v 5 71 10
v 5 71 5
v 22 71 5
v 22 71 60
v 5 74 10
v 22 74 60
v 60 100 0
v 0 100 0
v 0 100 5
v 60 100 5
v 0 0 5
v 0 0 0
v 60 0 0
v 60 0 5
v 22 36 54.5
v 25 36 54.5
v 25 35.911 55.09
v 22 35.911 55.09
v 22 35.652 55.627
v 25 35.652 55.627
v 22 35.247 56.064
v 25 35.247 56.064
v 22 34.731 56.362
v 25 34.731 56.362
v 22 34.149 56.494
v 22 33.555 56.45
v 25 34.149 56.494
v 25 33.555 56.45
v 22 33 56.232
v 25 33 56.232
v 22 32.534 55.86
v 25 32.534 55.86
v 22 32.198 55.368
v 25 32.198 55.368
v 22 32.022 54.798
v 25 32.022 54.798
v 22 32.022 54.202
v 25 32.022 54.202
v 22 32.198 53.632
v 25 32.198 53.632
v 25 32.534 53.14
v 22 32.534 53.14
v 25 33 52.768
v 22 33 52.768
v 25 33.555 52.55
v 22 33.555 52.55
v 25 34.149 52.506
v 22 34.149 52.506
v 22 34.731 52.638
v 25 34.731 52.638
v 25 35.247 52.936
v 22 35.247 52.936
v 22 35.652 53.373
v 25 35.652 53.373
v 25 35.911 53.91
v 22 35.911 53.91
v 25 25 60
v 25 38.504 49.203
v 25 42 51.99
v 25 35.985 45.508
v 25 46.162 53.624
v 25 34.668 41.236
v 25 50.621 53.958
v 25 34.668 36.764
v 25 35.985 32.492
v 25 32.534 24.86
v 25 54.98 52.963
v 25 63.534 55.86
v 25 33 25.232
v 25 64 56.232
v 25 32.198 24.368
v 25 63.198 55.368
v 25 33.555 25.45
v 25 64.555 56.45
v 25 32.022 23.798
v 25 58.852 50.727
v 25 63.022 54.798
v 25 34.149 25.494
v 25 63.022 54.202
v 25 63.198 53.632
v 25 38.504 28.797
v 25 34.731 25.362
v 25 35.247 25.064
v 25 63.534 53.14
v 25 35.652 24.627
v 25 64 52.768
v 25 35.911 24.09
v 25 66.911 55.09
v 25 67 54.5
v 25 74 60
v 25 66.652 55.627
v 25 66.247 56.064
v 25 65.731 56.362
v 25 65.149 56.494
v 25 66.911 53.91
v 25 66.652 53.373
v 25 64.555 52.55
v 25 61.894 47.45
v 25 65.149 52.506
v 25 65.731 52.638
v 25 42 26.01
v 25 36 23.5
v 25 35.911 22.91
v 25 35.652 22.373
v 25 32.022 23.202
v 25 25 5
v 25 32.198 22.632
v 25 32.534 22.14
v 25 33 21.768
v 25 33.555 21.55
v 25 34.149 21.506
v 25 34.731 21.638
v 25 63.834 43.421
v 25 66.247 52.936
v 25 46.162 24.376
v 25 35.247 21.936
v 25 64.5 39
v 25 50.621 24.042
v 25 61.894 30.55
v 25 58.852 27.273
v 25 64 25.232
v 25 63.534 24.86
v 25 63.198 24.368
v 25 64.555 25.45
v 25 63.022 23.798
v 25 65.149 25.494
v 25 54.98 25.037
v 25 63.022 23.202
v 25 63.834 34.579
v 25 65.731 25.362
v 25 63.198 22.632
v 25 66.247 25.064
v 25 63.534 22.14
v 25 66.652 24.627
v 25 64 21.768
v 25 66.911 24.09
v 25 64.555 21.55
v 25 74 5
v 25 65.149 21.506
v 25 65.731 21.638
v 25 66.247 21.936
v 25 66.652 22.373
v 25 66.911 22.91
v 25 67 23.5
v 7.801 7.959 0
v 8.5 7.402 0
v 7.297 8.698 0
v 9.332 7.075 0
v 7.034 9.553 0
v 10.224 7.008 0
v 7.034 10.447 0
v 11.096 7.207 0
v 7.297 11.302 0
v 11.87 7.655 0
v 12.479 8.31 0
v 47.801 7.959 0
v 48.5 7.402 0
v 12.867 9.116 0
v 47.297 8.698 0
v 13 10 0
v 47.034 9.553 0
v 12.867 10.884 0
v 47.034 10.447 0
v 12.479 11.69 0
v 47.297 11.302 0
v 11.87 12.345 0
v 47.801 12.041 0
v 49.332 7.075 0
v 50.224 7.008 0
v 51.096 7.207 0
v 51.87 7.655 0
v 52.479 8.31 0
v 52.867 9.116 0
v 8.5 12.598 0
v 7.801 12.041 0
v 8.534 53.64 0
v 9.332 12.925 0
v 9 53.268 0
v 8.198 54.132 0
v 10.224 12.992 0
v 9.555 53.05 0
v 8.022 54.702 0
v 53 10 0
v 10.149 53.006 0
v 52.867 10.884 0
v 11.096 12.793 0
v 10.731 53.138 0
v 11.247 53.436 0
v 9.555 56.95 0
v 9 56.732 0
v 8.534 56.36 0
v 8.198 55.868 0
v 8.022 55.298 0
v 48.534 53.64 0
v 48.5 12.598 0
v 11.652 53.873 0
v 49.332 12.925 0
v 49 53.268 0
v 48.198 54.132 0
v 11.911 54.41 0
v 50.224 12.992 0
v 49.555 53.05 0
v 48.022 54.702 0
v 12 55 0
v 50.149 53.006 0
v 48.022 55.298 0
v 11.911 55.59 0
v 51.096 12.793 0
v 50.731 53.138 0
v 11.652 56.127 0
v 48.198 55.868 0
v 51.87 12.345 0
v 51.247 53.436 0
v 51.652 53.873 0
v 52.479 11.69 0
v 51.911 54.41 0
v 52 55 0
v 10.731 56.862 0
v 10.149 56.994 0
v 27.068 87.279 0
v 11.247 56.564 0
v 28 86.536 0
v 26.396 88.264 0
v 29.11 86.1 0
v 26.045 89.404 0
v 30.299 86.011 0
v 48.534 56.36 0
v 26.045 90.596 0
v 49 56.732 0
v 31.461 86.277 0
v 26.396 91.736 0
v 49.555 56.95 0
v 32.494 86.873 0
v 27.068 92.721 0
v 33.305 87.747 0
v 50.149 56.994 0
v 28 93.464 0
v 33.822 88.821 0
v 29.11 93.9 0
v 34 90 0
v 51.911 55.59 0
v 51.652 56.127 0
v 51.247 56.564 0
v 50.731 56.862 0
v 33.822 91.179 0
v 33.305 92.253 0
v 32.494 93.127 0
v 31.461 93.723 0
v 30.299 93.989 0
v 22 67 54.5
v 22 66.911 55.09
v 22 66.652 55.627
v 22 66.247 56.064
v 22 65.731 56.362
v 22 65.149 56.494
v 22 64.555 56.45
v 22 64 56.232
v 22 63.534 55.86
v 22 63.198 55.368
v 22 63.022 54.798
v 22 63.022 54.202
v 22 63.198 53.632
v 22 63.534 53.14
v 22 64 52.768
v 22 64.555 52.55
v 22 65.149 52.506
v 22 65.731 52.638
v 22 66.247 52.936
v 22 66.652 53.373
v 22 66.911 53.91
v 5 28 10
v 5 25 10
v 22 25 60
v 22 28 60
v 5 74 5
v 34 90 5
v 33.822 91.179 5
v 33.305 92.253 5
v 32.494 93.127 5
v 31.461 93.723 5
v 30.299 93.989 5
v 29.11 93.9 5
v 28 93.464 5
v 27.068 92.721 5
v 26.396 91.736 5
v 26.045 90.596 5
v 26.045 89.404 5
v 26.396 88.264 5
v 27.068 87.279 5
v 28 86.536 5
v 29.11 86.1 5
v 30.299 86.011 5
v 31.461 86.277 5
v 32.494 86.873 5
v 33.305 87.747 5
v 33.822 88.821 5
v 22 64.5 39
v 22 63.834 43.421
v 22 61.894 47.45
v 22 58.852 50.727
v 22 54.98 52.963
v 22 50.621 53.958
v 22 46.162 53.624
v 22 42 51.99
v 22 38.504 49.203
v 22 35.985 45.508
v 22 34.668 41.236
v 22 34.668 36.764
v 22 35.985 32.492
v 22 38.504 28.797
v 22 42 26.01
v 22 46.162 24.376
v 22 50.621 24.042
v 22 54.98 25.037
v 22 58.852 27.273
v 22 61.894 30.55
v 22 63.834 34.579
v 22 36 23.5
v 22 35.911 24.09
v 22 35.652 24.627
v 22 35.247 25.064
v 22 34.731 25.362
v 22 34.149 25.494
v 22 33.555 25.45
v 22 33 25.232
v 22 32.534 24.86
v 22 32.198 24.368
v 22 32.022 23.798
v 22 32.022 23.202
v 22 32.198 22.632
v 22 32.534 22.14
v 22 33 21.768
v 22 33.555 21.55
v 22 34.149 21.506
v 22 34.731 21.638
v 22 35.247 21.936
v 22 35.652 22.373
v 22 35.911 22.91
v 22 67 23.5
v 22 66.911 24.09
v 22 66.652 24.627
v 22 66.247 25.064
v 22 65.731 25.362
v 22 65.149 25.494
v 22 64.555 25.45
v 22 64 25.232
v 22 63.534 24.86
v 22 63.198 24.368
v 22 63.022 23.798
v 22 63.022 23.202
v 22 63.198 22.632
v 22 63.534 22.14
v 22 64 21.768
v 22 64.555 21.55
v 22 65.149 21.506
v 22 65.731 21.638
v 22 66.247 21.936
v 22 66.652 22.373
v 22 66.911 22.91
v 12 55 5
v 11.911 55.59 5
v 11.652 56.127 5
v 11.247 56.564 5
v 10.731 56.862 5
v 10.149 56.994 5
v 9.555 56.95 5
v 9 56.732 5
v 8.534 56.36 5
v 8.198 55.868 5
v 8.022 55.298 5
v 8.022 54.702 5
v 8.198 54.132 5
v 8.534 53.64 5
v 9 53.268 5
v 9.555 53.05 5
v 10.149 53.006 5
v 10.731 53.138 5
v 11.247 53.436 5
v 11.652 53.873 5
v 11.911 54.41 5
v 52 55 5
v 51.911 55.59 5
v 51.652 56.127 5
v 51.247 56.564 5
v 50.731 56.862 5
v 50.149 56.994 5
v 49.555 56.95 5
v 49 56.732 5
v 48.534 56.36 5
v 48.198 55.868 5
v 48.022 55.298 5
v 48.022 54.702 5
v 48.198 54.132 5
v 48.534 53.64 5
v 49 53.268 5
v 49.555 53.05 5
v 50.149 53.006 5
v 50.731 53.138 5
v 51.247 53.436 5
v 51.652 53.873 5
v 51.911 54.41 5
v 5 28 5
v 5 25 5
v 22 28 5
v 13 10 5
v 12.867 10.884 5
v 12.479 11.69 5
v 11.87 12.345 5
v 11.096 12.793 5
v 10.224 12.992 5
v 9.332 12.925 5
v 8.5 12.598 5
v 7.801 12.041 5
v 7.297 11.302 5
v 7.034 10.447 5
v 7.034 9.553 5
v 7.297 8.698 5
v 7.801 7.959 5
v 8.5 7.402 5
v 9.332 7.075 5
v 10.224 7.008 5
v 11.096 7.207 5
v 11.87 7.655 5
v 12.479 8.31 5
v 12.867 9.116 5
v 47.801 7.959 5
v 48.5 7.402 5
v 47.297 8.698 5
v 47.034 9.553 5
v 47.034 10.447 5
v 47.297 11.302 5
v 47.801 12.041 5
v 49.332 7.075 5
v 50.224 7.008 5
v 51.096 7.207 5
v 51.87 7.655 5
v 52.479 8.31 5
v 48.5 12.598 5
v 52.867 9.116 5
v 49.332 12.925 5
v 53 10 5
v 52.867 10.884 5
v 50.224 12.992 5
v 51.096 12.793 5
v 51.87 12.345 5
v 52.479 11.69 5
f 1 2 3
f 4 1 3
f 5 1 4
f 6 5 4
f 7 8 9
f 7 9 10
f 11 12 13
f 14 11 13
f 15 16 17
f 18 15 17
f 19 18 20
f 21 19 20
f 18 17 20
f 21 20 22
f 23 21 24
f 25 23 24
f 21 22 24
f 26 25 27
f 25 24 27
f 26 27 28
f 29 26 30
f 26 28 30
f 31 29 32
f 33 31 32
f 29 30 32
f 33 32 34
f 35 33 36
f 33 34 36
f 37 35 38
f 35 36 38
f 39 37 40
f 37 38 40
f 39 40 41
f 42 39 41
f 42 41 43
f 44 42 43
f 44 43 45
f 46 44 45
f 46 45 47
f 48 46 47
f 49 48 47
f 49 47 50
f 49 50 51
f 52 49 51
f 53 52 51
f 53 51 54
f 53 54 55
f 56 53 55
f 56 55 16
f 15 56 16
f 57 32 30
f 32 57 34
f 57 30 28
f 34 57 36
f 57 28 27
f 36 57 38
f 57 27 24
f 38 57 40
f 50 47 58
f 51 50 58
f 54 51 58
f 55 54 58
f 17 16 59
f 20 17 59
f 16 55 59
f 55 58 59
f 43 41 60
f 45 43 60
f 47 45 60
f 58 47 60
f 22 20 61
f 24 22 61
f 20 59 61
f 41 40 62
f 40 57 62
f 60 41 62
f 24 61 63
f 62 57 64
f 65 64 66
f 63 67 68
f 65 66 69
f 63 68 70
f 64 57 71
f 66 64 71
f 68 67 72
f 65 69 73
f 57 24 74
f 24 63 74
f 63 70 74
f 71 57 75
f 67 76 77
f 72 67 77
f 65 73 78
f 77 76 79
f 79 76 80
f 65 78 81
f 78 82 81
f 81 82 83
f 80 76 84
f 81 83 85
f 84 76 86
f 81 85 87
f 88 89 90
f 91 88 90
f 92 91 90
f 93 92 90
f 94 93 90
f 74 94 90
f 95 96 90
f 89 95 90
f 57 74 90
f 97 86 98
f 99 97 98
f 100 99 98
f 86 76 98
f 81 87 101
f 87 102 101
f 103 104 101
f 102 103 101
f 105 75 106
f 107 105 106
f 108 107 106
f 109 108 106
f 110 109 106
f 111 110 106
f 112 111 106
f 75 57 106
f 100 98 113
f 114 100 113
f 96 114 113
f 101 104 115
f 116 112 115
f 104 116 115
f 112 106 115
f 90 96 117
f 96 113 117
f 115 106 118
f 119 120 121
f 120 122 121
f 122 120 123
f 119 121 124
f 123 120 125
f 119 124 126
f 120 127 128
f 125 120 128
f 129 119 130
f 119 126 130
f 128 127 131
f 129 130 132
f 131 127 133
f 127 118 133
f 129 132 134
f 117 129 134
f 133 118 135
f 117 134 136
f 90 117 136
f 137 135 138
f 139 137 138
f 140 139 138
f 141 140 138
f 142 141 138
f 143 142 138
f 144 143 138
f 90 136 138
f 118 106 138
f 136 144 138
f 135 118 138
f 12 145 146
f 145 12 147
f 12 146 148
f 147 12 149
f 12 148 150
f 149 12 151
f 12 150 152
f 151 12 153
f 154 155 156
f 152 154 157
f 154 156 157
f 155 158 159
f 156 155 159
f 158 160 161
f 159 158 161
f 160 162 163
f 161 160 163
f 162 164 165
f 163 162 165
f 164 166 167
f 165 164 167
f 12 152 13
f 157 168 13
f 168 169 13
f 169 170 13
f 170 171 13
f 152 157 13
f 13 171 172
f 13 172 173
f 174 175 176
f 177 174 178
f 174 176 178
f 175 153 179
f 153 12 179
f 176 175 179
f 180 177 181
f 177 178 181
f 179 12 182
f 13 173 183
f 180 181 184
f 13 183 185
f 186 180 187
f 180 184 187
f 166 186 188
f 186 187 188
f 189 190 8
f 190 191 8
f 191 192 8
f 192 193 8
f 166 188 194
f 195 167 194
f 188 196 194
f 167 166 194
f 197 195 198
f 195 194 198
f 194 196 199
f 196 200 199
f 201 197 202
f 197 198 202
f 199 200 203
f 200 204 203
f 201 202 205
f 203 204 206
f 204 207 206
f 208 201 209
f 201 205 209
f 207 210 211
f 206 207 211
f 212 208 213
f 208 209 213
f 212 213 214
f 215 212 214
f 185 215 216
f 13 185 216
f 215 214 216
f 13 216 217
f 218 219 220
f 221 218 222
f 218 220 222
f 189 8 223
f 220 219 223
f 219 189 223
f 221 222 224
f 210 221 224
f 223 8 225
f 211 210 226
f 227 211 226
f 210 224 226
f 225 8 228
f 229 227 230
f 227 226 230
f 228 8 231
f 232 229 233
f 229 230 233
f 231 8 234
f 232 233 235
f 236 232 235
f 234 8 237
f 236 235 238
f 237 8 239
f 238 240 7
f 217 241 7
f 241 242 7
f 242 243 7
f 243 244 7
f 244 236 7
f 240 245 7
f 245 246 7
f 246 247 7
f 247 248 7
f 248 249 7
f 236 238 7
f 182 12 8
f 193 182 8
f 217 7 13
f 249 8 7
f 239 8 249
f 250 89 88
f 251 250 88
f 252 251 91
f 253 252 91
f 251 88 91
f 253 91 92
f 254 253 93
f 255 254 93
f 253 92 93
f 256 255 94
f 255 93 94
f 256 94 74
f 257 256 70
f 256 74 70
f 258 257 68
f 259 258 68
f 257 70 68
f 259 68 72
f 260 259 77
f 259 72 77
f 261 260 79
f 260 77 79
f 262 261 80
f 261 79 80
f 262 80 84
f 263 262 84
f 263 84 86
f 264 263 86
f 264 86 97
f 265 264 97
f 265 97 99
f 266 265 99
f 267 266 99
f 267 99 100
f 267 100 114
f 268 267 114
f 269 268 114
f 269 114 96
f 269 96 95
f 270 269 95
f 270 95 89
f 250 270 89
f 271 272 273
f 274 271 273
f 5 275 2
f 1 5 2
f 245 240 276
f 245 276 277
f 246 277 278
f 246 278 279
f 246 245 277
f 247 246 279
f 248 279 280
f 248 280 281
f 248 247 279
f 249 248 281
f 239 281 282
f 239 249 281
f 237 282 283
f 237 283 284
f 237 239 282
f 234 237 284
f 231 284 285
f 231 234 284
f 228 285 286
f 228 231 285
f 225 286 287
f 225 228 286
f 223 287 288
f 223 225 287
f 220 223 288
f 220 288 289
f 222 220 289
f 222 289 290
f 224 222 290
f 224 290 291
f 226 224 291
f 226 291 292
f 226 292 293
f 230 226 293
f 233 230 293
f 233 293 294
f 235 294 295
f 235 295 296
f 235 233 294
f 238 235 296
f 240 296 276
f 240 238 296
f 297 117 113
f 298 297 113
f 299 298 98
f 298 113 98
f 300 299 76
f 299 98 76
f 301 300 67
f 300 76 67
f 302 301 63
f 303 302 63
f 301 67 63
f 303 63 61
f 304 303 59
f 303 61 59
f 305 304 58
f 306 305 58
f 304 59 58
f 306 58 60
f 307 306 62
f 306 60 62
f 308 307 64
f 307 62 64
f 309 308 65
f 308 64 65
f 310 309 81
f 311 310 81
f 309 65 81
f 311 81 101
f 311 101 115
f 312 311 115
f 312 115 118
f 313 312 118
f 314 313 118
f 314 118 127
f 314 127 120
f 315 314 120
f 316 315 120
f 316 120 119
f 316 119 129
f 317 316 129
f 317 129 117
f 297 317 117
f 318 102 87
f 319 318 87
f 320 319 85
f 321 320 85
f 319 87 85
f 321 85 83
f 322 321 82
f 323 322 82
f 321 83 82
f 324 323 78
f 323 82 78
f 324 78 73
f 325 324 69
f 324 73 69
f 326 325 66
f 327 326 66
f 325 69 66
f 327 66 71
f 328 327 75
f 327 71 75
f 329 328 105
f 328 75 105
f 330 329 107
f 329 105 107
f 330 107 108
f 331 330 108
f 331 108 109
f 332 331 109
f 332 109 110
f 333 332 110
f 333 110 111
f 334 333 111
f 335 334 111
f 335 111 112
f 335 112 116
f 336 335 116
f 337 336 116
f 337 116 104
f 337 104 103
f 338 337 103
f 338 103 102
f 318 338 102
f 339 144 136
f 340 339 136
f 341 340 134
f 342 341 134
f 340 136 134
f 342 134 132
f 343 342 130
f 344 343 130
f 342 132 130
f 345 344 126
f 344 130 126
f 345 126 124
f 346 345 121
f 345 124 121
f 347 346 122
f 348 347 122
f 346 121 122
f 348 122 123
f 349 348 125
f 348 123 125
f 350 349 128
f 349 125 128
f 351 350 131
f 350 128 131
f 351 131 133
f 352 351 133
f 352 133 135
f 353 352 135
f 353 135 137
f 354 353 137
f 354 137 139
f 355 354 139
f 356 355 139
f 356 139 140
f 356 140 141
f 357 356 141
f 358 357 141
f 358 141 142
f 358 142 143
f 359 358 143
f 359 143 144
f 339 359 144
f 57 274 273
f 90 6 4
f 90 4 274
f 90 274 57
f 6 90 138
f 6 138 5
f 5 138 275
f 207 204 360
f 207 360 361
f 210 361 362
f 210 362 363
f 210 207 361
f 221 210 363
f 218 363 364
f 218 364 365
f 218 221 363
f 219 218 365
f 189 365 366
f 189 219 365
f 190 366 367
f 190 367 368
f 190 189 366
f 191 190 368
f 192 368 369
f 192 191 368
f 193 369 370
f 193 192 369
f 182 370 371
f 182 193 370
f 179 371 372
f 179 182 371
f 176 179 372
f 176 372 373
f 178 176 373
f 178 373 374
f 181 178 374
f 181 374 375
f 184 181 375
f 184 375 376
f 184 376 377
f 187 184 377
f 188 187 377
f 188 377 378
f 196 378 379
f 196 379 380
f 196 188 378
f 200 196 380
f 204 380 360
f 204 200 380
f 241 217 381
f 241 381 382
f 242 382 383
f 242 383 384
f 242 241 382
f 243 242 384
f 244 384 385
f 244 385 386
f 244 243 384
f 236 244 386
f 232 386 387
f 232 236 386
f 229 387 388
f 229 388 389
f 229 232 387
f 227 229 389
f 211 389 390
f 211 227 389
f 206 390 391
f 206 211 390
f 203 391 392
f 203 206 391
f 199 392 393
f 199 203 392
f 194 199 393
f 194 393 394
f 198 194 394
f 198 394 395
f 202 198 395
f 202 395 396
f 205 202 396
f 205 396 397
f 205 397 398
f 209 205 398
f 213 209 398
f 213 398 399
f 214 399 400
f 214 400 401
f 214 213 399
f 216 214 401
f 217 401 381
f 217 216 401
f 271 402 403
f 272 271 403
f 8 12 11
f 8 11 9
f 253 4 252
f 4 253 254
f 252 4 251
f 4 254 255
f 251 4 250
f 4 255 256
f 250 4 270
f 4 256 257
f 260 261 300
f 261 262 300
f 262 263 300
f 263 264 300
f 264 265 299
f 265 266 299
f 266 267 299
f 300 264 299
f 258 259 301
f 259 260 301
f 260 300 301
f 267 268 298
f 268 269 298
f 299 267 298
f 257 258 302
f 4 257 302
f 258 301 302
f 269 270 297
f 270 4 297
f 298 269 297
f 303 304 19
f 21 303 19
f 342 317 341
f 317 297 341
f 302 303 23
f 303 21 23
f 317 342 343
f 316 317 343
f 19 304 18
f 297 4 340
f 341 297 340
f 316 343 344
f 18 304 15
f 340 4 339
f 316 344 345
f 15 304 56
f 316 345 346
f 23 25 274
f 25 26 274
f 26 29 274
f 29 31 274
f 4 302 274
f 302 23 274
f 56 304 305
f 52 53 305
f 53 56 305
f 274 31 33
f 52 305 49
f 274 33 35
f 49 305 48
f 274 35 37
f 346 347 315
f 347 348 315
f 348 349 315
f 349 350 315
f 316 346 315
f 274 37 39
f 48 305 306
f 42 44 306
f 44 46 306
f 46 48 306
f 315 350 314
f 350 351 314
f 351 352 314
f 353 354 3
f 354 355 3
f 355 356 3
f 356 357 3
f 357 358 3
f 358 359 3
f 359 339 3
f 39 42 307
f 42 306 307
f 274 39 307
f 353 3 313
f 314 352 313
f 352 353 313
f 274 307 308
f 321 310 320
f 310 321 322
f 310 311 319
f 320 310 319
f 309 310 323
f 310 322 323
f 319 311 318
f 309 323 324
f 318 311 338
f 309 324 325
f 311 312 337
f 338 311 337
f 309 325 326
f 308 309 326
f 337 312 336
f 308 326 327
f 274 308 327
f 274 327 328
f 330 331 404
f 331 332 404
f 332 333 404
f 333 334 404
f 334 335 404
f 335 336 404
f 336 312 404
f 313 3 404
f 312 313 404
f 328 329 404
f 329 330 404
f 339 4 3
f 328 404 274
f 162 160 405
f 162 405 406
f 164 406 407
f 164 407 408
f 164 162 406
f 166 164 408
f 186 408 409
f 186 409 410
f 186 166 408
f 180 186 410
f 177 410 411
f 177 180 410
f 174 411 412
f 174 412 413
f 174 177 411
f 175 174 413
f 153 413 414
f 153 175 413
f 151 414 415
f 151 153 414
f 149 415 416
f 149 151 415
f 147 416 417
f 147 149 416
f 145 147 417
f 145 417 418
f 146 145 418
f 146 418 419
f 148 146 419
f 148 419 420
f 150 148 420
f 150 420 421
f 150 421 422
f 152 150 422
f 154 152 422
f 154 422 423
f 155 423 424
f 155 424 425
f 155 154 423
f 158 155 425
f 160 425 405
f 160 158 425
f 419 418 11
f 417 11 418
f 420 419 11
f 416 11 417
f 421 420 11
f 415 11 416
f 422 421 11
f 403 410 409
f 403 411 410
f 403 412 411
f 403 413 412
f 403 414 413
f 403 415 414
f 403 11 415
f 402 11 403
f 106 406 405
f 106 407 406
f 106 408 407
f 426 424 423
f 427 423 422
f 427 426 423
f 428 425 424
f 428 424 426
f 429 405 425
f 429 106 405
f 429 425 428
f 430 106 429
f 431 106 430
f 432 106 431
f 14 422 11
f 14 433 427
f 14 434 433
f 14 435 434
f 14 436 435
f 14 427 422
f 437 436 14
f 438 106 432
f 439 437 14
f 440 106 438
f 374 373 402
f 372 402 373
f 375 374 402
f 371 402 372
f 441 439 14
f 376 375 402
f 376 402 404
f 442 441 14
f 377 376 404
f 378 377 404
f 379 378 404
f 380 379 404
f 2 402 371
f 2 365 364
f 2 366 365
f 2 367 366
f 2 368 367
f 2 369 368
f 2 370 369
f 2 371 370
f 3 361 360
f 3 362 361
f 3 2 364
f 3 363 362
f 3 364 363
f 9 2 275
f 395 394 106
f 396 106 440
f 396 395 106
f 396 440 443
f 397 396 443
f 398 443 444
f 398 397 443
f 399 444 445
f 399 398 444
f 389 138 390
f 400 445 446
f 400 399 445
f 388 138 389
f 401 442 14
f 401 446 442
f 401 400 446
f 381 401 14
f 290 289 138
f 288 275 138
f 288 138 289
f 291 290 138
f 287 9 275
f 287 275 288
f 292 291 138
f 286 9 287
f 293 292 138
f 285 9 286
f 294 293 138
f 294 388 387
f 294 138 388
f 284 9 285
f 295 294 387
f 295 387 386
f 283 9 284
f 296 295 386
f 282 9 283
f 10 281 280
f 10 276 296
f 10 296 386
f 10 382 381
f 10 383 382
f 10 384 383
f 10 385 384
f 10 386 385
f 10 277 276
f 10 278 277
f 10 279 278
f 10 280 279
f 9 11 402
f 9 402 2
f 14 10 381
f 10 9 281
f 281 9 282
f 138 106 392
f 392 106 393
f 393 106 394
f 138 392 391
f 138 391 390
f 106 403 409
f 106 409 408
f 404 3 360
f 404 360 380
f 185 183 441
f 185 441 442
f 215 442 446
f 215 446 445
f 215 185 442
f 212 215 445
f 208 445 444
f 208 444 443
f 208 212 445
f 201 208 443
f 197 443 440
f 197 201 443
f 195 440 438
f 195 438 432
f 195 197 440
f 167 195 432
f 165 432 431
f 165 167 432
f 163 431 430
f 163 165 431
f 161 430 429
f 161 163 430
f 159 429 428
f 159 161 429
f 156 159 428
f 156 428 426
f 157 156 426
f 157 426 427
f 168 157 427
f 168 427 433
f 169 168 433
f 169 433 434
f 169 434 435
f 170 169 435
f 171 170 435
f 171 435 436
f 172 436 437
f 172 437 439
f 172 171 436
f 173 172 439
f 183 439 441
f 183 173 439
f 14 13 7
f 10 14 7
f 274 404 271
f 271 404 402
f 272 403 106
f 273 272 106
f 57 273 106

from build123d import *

# Parameters (mm, degrees)
F0_W     = 60
F0_H     = 100
F0_R     = 3
F0_R_2   = 2
F0_R_3   = 4
F1_DEPTH = 5
F3_DEPTH = 55
F5_DEPTH = 75.001
F6_R     = 15
F6_R_2   = 2
F7_DEPTH = 25.001


with BuildPart() as f1:
    # F0 (on Top) → F1 (new body)
    with BuildSketch(Plane.XY):
        with Locations((30, 50)):
            Rectangle(F0_W, F0_H)
        with Locations((10, 10)):
            Circle(F0_R, mode=Mode.SUBTRACT)
        with Locations((50, 10)):
            Circle(F0_R, mode=Mode.SUBTRACT)
        with Locations((10, 55)):
            Circle(F0_R_2, mode=Mode.SUBTRACT)
        with Locations((50, 55)):
            Circle(F0_R_2, mode=Mode.SUBTRACT)
        with Locations((30, 90)):
            Circle(F0_R_3, mode=Mode.SUBTRACT)
    extrude(amount=F1_DEPTH)

    # F2 (on face) → F3 (join)
    with BuildSketch(Plane.XY.offset(5)):
        Polygon((25, 74), (5, 74), (5, 71), (22, 71), (22, 28), (5, 28), (5, 25), (25, 25), align=None)
    extrude(amount=F3_DEPTH)

    # F4 (on face) → F5 (cut, through all)
    with BuildSketch(Plane.XZ.offset(-25)):
        Polygon((22, 60), (5, 60), (5, 10), align=None)
    extrude(amount=-F5_DEPTH, mode=Mode.SUBTRACT)

    # F6 (on face) → F7 (cut, through all)
    with BuildSketch(Plane.YZ.offset(25)):
        with Locations((49.5, 39)):
            Circle(F6_R)
        with Locations((34, 54.5)):
            Circle(F6_R_2)
        with Locations((65, 54.5)):
            Circle(F6_R_2)
        with Locations((65, 23.5)):
            Circle(F6_R_2)
        with Locations((34, 23.5)):
            Circle(F6_R_2)
    extrude(amount=-F7_DEPTH, mode=Mode.SUBTRACT)


solid = f1.part
